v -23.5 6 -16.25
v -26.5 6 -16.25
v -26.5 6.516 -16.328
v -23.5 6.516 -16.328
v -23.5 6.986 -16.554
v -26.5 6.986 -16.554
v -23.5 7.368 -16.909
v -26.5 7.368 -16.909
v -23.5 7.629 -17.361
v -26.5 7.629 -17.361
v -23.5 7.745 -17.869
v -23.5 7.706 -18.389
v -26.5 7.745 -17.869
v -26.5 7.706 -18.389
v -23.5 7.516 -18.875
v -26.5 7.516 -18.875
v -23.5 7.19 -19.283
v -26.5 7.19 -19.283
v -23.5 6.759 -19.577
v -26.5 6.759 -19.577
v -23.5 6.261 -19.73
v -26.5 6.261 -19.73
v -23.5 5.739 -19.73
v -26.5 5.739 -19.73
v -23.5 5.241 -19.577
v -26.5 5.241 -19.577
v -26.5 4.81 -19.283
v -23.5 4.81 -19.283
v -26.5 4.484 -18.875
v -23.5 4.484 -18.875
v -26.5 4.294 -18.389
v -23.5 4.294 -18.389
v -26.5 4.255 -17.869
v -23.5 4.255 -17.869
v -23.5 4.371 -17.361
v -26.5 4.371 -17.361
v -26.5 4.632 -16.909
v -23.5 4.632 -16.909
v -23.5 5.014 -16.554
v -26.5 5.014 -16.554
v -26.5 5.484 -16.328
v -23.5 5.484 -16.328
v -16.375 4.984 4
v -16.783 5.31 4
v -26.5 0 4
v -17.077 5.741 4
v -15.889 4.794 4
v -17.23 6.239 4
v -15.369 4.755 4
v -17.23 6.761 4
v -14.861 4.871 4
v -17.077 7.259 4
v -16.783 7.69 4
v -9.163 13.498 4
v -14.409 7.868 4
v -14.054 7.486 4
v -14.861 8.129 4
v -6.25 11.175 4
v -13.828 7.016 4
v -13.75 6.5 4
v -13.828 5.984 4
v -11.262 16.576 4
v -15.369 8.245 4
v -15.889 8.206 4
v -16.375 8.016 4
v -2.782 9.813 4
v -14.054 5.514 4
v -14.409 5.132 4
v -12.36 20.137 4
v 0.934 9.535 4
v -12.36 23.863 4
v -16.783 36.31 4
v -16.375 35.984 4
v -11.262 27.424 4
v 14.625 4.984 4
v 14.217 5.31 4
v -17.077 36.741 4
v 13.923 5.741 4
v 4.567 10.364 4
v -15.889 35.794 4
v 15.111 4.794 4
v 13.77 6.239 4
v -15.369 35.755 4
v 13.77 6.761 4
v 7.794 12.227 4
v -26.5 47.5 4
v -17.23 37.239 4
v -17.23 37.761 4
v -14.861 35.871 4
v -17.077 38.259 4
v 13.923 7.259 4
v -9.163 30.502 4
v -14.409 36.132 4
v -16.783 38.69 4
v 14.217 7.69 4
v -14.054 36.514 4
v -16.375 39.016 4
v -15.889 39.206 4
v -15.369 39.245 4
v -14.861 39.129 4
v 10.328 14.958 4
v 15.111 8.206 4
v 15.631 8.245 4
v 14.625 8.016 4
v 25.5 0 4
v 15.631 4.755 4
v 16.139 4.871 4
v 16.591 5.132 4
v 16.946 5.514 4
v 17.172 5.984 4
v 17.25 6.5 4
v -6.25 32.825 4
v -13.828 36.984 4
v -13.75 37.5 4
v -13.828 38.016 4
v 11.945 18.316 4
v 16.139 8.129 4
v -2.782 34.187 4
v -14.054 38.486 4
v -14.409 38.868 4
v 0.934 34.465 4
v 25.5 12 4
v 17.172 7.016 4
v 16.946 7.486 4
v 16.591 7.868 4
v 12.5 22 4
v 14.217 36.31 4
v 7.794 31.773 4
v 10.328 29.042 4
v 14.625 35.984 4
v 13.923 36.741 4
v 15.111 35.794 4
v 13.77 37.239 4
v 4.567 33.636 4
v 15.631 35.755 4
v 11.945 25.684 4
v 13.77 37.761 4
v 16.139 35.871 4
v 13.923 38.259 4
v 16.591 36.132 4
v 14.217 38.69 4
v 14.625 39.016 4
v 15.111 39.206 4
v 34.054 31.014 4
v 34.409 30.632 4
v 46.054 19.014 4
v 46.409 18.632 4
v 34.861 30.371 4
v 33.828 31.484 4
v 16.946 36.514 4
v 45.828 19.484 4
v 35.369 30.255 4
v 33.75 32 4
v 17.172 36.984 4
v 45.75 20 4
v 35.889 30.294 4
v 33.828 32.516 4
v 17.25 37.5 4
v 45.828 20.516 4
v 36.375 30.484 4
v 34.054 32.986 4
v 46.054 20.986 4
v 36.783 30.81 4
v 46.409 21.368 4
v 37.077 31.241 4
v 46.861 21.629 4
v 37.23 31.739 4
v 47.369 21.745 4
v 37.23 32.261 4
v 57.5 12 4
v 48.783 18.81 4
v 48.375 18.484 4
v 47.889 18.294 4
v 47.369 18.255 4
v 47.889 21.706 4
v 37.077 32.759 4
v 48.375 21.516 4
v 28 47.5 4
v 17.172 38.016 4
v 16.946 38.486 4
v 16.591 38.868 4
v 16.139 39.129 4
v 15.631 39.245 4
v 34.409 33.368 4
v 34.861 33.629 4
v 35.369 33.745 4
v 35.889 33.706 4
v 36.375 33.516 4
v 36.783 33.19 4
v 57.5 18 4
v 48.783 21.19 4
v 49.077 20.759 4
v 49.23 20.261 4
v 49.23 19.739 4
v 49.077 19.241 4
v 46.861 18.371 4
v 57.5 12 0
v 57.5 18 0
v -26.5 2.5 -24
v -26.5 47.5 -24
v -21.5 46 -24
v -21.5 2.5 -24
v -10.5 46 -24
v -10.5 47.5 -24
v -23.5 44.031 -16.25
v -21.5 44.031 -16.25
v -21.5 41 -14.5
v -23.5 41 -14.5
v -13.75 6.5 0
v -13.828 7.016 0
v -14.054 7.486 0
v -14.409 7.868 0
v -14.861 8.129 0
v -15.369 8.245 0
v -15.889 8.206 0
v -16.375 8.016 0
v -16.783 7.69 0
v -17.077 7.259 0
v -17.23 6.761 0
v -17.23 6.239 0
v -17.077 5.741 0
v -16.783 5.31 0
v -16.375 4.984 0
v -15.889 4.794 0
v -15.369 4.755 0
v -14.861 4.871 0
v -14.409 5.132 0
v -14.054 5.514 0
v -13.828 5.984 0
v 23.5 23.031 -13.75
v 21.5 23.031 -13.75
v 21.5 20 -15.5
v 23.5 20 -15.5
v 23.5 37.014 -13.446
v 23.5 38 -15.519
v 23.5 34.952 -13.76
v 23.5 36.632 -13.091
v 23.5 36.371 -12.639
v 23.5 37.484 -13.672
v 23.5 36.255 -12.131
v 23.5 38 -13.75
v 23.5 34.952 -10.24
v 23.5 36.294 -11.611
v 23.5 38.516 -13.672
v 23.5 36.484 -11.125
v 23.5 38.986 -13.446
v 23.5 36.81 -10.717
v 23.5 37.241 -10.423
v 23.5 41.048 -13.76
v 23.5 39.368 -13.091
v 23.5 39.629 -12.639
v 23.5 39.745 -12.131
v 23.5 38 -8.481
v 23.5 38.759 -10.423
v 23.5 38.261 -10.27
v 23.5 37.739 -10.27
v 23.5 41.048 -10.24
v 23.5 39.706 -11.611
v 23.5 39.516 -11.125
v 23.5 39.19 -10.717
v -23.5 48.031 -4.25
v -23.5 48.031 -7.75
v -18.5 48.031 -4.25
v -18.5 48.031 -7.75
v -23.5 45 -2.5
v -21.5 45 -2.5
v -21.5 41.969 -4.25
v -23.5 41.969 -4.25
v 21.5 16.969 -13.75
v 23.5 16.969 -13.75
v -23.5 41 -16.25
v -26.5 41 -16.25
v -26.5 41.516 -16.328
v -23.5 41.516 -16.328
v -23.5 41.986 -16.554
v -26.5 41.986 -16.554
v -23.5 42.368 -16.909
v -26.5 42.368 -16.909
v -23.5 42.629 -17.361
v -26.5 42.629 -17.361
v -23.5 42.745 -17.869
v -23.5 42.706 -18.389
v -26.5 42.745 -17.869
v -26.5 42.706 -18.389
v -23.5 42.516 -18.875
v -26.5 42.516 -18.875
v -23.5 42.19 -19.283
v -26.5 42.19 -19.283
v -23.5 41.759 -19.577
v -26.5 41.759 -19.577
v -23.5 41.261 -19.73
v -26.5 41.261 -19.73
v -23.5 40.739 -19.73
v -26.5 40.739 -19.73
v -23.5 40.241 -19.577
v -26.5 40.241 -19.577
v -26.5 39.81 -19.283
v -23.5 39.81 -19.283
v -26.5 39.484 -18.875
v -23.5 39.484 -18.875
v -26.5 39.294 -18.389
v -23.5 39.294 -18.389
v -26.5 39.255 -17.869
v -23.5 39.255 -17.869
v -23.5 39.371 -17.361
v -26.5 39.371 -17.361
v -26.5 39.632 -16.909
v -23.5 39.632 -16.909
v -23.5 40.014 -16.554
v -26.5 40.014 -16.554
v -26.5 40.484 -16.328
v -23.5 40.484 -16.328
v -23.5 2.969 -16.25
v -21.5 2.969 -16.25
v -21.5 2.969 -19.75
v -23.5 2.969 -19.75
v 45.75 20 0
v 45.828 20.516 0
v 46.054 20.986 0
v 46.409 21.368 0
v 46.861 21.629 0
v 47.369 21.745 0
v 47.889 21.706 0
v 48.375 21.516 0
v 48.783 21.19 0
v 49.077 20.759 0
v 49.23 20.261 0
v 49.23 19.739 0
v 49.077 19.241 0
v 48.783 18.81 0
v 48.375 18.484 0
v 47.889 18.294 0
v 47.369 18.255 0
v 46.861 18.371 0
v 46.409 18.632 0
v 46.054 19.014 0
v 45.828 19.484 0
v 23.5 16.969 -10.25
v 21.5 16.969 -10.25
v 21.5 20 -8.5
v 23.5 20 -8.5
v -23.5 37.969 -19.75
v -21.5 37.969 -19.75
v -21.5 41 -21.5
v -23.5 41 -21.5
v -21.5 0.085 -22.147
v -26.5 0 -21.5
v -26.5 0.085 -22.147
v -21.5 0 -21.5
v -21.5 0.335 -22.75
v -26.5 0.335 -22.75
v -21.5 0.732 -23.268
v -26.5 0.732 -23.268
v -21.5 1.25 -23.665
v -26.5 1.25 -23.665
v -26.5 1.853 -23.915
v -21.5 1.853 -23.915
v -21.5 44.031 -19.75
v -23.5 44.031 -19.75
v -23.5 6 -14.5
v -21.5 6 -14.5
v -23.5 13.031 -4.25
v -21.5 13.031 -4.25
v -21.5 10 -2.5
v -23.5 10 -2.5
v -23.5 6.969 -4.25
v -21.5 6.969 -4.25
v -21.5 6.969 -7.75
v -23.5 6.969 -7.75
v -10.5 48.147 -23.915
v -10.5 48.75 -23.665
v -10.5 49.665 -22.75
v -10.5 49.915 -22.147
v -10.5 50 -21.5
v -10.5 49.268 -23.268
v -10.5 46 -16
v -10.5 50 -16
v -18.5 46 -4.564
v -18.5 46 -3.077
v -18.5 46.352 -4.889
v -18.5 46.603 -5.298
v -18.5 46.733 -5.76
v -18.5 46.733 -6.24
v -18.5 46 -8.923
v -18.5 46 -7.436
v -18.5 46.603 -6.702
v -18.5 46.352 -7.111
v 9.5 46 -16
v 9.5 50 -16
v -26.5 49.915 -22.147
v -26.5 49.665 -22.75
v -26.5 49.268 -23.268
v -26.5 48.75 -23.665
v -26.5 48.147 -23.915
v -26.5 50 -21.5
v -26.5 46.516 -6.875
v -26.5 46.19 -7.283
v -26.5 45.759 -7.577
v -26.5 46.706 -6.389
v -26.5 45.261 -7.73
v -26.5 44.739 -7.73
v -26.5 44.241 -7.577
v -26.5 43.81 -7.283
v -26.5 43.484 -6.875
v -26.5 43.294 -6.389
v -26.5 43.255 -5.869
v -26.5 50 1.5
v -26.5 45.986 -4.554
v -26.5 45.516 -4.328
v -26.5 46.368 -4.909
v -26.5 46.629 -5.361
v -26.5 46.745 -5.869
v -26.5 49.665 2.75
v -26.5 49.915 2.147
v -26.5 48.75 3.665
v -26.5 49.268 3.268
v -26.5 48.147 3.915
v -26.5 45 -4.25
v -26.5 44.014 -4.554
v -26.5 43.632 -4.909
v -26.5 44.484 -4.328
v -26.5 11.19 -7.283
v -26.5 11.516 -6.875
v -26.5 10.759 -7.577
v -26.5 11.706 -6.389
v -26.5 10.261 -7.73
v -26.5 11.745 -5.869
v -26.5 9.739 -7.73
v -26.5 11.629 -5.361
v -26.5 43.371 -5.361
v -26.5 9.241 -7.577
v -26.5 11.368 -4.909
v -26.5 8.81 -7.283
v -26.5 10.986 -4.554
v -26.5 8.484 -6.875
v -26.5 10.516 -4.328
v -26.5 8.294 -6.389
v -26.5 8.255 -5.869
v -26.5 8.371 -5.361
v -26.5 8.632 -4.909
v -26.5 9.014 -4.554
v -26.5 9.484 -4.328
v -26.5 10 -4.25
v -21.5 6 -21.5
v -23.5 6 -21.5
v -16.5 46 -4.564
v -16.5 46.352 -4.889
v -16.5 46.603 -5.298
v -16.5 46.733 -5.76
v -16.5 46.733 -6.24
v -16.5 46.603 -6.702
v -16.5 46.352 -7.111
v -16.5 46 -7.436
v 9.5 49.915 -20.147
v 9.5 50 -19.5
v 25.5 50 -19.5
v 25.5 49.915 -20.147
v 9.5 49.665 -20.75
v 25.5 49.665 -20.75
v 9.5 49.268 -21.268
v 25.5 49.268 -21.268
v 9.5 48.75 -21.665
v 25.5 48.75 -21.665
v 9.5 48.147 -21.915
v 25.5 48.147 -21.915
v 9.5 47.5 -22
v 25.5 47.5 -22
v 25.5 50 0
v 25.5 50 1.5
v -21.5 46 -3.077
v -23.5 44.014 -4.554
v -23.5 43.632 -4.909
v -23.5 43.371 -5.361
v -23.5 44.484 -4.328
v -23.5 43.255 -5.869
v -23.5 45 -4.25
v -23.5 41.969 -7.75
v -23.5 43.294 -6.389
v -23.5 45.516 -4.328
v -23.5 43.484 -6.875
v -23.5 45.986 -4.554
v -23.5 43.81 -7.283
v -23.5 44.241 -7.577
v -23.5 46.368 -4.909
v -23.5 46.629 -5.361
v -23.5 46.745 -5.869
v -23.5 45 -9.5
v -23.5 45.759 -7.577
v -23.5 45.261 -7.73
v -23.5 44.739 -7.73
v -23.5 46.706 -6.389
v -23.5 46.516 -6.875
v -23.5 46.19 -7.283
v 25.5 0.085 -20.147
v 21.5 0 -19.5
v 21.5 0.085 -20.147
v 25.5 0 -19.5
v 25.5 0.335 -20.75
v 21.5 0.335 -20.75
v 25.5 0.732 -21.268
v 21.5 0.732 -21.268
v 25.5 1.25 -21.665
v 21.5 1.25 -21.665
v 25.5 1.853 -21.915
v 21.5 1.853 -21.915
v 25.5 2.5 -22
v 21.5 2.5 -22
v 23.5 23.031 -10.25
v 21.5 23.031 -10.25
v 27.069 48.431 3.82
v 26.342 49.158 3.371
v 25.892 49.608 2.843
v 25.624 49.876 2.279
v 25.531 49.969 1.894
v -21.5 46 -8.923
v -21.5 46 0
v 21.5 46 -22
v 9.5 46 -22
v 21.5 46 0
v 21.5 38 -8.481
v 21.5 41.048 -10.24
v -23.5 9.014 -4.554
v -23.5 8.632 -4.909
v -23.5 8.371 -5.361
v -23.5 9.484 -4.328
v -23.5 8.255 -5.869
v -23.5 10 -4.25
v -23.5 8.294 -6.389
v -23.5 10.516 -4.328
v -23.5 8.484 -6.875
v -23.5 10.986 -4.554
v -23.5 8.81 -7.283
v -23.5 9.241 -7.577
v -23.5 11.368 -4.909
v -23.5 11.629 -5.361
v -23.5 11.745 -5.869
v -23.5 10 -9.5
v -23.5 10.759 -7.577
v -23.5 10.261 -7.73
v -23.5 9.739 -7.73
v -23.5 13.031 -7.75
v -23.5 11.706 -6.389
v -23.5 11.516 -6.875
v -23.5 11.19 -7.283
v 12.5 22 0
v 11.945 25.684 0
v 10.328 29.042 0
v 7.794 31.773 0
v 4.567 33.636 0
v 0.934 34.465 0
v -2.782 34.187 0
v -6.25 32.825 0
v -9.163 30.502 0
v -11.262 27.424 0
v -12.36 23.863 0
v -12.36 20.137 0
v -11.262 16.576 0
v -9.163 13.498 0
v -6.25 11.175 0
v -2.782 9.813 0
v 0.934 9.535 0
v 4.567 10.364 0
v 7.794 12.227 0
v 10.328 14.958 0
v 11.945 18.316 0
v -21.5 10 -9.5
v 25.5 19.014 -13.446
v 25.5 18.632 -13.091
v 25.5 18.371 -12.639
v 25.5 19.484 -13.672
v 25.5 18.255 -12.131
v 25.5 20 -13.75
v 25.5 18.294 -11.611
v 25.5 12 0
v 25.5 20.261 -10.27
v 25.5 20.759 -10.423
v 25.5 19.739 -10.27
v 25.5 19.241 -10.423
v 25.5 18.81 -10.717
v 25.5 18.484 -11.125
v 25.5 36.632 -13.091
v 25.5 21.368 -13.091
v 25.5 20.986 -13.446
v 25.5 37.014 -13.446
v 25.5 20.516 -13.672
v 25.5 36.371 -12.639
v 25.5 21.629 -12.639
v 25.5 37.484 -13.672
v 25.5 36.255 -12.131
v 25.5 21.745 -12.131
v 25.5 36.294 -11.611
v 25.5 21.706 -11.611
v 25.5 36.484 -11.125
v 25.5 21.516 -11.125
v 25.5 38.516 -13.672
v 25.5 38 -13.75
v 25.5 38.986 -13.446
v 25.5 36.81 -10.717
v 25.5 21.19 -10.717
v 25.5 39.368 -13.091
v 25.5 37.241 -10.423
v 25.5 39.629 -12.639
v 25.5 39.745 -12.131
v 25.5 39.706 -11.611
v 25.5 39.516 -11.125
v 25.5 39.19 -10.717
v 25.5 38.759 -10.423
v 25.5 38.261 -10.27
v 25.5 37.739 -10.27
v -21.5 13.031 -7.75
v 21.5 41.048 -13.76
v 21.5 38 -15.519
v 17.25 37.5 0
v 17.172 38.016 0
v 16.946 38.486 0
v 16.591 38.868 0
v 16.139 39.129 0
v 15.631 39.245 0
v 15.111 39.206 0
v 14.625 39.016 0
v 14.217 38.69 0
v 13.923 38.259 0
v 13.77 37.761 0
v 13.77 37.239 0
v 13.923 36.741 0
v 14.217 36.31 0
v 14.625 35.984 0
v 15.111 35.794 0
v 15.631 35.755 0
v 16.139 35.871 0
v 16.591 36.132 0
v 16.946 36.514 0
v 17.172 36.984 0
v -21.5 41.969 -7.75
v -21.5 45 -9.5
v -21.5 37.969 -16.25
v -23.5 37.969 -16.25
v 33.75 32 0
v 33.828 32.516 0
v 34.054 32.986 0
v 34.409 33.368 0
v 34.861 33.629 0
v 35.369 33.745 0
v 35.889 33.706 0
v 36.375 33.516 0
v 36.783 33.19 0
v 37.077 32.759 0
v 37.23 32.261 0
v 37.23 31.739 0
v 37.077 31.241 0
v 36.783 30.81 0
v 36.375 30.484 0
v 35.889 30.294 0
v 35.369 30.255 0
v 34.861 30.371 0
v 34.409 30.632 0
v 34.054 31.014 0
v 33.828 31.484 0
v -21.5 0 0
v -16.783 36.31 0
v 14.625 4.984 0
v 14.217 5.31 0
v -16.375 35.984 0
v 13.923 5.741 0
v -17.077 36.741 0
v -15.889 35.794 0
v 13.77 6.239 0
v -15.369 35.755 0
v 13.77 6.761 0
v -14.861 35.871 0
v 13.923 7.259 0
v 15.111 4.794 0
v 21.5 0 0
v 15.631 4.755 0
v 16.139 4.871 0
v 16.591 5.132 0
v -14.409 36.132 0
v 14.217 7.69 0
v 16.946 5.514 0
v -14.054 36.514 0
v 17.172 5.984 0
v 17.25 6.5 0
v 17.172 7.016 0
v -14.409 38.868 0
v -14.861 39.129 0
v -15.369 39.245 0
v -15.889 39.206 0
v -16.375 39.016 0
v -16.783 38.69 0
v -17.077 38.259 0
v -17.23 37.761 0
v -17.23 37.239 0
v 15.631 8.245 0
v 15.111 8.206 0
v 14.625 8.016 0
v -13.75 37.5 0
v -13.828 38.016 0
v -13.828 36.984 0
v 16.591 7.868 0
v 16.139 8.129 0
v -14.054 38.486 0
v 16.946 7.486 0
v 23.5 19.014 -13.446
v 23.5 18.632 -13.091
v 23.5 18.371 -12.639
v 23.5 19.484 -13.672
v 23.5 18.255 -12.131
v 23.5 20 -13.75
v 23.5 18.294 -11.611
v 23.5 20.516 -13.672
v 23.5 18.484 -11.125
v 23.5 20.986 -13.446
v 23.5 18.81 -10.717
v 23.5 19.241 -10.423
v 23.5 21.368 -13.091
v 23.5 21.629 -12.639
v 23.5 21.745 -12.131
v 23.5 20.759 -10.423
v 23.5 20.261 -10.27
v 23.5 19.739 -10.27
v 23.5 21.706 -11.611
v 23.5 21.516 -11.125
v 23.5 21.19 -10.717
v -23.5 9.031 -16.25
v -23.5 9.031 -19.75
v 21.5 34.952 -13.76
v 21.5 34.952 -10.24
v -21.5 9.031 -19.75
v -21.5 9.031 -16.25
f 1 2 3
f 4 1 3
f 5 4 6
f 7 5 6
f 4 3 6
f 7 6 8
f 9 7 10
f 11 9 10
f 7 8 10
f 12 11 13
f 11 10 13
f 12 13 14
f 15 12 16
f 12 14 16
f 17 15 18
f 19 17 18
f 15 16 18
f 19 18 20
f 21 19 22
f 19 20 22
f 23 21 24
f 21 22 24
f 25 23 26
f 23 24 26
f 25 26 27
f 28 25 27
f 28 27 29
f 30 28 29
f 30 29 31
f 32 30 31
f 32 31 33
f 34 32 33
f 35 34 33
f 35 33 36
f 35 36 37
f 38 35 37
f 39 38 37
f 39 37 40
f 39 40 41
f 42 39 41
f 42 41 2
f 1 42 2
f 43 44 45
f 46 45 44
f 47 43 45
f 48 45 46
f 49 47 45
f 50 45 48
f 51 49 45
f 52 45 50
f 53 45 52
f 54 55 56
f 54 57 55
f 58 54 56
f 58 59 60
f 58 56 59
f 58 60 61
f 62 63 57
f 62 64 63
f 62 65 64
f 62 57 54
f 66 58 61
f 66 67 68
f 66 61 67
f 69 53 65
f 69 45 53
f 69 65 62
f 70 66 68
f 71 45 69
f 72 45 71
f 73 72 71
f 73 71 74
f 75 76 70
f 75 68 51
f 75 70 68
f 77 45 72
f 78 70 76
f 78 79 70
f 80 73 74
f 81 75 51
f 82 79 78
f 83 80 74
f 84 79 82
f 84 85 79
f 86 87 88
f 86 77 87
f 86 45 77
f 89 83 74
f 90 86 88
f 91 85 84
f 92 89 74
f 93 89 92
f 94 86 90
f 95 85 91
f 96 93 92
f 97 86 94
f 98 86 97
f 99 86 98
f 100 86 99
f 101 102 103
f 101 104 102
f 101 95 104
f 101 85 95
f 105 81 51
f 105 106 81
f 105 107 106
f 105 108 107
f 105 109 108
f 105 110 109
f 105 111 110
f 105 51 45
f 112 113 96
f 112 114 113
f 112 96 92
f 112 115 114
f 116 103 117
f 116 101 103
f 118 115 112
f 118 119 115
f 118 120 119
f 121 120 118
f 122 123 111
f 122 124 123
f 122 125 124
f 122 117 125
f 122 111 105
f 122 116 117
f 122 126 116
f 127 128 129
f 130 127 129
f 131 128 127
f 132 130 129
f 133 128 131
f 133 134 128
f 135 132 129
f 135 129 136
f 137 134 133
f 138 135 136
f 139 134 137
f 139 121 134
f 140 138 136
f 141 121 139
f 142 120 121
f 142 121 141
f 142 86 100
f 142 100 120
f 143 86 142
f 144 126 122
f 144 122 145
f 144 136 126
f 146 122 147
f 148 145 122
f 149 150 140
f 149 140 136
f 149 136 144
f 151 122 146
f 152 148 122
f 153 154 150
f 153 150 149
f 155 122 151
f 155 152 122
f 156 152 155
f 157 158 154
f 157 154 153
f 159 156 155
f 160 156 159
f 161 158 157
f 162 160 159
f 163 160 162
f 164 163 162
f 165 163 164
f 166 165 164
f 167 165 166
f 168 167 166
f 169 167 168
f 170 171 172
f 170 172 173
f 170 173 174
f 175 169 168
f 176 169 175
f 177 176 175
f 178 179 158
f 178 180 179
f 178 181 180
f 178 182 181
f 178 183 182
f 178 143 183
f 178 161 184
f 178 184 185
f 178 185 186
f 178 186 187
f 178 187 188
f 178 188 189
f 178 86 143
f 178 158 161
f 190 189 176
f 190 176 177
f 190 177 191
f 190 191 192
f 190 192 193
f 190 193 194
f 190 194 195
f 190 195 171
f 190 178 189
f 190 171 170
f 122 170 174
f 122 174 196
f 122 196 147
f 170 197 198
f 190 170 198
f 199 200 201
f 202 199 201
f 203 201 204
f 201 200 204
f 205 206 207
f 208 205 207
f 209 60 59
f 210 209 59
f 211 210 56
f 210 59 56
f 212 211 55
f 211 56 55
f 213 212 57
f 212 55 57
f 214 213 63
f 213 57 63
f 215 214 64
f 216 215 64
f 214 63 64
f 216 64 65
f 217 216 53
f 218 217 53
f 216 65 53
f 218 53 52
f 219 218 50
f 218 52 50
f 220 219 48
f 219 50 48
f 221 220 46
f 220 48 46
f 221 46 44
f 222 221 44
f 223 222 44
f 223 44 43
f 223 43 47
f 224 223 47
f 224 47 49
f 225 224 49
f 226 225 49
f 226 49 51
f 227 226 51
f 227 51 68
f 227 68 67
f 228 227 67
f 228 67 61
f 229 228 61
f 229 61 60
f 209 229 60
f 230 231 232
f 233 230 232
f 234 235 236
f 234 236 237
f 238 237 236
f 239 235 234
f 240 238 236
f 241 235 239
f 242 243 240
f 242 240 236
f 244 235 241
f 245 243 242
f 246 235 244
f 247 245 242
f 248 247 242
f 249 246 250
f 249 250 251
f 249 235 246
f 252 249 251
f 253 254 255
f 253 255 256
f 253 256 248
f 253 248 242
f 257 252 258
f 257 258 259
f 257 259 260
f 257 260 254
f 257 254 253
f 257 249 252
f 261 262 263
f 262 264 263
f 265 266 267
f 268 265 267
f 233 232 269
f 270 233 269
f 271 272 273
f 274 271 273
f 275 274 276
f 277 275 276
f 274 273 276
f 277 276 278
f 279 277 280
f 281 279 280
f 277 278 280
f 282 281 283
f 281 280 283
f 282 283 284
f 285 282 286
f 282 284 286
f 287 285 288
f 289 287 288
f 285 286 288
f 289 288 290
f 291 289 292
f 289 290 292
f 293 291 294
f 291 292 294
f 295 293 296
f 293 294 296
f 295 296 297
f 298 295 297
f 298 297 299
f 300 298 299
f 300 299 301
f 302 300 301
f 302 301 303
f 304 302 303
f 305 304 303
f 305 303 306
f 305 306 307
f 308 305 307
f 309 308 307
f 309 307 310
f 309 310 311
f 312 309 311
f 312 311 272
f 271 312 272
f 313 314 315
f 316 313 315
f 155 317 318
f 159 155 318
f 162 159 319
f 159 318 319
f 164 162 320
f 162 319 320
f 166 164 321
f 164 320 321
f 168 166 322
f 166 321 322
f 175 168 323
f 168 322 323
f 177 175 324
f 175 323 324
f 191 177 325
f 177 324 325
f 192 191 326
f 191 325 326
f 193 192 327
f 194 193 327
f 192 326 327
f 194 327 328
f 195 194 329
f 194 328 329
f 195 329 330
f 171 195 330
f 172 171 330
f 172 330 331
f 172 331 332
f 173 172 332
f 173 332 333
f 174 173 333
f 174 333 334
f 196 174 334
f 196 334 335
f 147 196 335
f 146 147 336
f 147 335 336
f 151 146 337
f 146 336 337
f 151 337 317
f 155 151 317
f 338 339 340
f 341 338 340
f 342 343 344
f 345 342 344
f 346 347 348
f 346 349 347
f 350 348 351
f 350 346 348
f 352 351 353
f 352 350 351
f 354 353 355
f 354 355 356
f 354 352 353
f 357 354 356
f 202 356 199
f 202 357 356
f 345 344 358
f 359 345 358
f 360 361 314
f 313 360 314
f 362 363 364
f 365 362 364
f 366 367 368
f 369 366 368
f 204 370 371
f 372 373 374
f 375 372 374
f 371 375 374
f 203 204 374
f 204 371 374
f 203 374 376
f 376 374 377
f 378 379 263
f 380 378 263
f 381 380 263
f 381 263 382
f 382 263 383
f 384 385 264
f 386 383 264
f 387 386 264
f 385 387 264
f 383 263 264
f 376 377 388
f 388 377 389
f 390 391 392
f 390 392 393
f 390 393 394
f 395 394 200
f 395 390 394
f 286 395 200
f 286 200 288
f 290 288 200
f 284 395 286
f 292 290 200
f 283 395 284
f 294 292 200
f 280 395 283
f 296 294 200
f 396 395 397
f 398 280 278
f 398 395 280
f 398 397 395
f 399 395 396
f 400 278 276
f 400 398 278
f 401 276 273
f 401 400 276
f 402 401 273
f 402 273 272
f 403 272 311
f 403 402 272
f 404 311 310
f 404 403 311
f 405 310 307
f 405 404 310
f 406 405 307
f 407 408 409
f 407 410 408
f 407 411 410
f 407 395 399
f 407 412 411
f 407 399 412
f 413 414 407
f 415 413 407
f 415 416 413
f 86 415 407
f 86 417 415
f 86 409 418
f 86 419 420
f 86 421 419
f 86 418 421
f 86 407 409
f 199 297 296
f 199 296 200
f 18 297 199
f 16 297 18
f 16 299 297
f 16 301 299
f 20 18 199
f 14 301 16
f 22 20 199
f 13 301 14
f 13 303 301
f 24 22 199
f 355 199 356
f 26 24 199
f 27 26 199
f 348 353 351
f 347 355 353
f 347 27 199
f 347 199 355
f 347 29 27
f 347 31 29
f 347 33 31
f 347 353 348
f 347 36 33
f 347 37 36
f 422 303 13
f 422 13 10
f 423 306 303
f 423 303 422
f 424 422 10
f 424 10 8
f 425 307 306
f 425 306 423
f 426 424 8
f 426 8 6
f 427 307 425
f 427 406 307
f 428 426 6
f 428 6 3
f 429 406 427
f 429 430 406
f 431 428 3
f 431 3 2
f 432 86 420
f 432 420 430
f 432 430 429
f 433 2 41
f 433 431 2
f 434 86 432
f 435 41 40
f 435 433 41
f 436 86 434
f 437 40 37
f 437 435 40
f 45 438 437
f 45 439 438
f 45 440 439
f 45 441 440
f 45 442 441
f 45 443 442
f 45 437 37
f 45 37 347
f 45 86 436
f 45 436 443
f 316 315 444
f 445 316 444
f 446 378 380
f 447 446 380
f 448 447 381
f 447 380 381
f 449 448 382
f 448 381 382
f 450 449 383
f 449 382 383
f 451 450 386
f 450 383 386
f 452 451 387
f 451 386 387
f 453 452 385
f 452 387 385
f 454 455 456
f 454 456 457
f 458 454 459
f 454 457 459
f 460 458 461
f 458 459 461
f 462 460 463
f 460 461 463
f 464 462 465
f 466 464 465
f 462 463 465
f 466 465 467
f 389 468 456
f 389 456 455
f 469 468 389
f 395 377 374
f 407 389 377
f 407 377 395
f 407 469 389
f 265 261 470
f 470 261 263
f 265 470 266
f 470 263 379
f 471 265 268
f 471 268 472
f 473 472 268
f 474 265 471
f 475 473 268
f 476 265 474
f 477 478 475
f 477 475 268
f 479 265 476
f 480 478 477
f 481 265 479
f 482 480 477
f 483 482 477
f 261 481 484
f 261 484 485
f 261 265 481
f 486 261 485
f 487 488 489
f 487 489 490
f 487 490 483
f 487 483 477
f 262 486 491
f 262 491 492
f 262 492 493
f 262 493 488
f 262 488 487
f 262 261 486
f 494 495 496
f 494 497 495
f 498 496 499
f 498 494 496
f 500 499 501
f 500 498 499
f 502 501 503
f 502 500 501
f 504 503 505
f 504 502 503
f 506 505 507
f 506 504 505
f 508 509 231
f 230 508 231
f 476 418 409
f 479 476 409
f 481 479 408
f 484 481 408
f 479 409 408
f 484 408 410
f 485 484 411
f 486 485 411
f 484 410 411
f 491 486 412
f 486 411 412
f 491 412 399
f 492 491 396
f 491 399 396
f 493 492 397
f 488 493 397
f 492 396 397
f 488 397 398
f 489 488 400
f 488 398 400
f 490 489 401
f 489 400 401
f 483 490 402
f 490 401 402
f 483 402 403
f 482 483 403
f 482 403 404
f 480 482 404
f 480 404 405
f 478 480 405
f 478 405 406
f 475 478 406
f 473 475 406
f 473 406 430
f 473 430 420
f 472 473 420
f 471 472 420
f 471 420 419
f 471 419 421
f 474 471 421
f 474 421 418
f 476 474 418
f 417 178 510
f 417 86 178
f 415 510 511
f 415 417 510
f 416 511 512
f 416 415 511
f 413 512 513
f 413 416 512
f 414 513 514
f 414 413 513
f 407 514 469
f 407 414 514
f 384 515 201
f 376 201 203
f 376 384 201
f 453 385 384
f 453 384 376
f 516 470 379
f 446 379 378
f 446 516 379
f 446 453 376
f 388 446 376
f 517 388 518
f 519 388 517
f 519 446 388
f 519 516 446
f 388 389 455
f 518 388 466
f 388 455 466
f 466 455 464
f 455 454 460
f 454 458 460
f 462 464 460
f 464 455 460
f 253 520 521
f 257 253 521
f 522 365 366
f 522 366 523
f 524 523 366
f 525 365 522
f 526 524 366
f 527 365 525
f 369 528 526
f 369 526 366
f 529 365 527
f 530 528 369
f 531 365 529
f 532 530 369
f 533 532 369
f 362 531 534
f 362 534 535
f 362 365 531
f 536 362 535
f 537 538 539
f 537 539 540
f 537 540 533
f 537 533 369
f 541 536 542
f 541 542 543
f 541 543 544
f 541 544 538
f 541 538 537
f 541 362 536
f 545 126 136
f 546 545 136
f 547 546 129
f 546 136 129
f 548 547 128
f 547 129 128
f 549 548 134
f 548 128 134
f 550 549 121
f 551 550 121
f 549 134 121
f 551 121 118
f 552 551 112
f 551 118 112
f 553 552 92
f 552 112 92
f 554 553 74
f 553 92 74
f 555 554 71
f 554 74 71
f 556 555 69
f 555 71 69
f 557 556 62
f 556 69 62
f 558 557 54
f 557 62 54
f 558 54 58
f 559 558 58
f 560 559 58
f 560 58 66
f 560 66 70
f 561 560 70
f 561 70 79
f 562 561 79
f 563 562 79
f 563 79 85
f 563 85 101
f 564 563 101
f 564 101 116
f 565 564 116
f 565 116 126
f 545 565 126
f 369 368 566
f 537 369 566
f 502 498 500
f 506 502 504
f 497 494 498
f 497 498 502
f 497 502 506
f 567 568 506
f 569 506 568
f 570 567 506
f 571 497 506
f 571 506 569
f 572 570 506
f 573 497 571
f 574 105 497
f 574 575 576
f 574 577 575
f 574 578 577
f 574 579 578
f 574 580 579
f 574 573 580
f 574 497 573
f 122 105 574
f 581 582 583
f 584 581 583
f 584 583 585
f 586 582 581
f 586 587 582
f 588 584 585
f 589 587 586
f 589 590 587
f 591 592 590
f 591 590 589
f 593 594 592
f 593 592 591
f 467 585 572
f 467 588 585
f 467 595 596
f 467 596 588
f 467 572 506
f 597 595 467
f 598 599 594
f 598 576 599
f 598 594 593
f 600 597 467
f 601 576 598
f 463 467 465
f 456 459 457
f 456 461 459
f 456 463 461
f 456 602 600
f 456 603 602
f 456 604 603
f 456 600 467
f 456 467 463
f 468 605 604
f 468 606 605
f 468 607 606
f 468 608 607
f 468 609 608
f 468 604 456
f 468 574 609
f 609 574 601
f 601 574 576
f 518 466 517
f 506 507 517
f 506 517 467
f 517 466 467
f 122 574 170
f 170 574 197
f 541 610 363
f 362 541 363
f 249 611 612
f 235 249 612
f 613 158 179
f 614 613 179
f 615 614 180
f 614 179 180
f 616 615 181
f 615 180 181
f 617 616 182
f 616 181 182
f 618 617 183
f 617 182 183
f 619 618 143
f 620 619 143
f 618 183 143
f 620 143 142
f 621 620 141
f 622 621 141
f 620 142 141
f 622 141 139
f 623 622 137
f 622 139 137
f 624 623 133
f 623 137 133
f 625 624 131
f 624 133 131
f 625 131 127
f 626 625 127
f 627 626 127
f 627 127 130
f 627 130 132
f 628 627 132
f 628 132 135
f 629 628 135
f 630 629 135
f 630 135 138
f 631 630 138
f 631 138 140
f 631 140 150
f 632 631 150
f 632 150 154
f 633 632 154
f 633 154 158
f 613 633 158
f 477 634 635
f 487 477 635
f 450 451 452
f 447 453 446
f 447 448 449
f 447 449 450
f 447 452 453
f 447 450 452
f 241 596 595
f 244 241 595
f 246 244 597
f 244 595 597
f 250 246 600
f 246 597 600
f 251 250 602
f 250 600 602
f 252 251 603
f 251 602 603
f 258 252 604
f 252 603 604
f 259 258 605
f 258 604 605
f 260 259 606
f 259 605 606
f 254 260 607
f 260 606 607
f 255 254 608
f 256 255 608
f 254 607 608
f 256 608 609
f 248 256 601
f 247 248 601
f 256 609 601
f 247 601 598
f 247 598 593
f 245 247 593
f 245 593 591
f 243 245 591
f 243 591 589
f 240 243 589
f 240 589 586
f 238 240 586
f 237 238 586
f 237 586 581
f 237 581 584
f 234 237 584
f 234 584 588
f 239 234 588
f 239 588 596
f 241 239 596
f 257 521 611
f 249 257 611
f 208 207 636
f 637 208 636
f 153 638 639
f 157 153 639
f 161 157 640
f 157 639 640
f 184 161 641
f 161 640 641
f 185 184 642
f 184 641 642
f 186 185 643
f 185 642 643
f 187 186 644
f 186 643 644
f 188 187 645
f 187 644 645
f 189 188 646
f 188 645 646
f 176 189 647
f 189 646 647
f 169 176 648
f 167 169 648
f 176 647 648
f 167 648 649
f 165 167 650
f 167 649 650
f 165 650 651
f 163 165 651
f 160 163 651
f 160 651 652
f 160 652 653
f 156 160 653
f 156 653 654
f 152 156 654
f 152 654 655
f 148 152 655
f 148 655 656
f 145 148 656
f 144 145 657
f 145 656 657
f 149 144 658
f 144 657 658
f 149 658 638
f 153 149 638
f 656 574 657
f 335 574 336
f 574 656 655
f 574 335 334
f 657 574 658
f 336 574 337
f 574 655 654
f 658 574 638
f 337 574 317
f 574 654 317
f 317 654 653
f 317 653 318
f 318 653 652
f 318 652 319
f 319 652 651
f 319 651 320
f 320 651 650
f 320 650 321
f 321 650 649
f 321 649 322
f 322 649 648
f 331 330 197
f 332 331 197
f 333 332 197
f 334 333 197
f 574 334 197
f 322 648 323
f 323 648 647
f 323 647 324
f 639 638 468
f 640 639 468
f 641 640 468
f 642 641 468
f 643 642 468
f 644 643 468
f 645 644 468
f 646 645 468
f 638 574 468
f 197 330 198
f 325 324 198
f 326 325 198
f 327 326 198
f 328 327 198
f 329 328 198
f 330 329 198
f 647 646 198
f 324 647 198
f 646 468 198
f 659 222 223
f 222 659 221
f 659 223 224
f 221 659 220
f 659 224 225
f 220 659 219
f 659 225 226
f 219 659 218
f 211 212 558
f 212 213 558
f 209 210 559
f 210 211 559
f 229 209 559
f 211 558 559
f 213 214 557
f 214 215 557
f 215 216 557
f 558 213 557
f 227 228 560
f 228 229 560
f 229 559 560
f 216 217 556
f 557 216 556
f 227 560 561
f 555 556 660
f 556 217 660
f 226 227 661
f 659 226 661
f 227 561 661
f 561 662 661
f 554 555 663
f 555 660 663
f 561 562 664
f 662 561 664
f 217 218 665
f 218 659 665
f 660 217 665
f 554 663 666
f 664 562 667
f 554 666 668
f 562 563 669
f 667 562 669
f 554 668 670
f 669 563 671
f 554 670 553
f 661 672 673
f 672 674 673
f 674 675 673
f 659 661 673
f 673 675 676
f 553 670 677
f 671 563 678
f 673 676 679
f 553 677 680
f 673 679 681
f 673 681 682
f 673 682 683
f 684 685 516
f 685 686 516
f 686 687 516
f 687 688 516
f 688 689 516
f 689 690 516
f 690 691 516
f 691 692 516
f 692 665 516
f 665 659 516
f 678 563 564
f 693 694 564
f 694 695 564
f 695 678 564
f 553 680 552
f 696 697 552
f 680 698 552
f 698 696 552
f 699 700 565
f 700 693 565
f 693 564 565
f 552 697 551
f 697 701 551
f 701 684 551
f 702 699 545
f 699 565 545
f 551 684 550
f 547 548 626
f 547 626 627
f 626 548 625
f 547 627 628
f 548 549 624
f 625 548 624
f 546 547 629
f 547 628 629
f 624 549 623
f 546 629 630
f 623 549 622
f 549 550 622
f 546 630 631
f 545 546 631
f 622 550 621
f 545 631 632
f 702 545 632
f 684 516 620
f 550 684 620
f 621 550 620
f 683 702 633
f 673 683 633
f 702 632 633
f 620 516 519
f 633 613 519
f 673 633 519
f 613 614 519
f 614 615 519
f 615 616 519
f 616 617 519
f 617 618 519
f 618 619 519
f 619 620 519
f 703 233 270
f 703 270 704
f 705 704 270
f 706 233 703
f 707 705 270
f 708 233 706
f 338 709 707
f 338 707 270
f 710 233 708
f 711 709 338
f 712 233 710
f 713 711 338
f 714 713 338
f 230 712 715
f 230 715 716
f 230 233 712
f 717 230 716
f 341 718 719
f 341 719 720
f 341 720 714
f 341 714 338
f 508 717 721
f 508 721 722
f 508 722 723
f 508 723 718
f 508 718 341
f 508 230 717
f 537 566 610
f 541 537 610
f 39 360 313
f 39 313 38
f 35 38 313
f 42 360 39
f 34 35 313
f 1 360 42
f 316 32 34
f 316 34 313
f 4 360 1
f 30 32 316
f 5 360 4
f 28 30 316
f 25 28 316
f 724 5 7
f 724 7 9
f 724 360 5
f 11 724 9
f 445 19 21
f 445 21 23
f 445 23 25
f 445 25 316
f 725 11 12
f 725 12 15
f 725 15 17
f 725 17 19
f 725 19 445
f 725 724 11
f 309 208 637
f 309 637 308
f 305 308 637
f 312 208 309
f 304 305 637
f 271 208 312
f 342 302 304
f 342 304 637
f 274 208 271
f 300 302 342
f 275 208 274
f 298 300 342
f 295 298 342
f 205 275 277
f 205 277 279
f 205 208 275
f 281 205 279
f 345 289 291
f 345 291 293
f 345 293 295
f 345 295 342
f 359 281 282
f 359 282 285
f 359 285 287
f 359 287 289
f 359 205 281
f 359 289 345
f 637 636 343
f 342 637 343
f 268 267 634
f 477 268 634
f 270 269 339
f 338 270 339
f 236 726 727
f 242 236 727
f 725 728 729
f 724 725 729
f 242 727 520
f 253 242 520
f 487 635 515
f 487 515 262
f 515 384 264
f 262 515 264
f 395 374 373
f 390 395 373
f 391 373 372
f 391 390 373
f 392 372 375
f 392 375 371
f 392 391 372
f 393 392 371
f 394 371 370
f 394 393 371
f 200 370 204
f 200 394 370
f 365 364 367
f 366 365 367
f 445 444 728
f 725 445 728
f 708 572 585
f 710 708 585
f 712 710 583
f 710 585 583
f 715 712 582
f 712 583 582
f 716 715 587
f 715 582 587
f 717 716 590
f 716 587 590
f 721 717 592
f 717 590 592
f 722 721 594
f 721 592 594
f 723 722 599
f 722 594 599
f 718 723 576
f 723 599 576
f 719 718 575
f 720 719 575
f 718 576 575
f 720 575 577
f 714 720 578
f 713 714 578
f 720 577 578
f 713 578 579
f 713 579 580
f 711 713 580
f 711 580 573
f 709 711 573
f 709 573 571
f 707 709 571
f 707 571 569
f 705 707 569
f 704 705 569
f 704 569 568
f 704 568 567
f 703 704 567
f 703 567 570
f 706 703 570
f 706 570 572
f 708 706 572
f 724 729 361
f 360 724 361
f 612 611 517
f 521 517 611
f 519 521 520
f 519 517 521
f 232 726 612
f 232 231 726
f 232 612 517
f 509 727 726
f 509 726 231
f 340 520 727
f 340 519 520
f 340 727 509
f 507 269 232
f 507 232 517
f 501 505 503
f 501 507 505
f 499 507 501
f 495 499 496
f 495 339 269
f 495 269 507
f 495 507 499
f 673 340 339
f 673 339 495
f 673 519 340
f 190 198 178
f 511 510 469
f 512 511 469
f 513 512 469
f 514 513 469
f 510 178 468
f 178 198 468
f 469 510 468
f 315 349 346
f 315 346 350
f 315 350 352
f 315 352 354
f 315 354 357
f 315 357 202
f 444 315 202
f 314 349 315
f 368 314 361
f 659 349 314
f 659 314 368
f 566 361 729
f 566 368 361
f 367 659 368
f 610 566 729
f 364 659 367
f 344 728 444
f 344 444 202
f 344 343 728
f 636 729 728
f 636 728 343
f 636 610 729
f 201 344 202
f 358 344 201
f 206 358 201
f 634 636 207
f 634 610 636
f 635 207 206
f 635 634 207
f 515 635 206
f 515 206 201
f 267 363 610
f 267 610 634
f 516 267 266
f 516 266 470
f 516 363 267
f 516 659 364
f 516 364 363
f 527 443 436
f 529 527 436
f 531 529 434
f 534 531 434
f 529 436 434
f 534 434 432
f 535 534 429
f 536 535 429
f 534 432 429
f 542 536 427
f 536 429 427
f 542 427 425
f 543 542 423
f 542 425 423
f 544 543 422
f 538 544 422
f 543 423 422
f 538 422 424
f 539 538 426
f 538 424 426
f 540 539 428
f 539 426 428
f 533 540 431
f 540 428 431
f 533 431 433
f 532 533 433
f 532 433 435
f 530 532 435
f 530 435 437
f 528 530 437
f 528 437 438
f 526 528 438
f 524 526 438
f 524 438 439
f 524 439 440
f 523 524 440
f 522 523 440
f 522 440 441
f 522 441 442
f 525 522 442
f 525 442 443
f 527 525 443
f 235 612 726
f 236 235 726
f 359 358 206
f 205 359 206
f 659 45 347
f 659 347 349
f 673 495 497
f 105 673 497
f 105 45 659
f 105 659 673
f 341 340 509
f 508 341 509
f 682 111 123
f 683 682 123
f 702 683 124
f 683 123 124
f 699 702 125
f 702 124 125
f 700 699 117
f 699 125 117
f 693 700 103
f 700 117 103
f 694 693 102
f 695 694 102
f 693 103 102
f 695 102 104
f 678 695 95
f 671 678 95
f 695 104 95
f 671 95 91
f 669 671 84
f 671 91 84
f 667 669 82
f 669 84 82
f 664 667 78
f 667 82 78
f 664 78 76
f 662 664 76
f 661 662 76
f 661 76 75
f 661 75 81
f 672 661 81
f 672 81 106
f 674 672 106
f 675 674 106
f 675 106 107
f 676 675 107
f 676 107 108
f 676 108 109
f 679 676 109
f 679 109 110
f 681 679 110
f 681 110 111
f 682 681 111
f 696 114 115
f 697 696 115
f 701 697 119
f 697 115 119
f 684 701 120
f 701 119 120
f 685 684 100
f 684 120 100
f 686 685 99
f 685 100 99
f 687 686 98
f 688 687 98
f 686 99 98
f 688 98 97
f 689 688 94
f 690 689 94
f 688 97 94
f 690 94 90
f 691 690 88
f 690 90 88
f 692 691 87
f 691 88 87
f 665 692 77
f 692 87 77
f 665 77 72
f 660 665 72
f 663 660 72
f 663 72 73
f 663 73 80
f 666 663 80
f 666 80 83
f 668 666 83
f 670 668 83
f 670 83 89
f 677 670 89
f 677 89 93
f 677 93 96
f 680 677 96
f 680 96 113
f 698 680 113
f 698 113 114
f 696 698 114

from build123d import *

# Parameters (mm, degrees)
BOSS_EXTRUDE1_DEPTH      = 4
SKETCH2_R                = 12.5
SKETCH2_R_2              = 1.75
CUT_EXTRUDE1_DEPTH       = 5
SKETCH9_R                = 1.75
CUT_EXTRUDE2_DEPTH       = 4
BOSS_EXTRUDE8_DEPTH      = 24
SKETCH18_R               = 1.75
CUT_EXTRUDE7_DEPTH       = 4
SKETCH19_R               = 1.75
CUT_EXTRUDE8_DEPTH       = 10
CUT_EXTRUDE9_DEPTH       = 50
FILLET1_R                = 2.5
CUT_EXTRUDE11_DEPTH      = 3
CUT_EXTRUDE11_DEPTH_BACK = 2
CUT_EXTRUDE12_DEPTH      = 2
CUT_EXTRUDE13_DEPTH      = 2
FILLET2_R                = 2.5


with BuildPart() as part:
    # Sketch1 → Boss-Extrude1 (new body)
    with BuildSketch(Plane.XY):
        Polygon((57.5, 18), (25.5, 50), (-26.5, 50), (-26.5, 0), (25.5, 0), (25.5, 12), (57.5, 12), align=None)
    extrude(amount=BOSS_EXTRUDE1_DEPTH)

    # Sketch2 → Cut-Extrude1 (cut, through all)
    with BuildSketch(Plane.XY.offset(4)):
        with Locations((0, 22)):
            Circle(SKETCH2_R)
        with Locations((15.5, 6.5)):
            Circle(SKETCH2_R_2)
        with Locations((15.5, 37.5)):
            Circle(SKETCH2_R_2)
        with Locations((-15.5, 37.5)):
            Circle(SKETCH2_R_2)
        with Locations((-15.5, 6.5)):
            Circle(SKETCH2_R_2)
    extrude(amount=-CUT_EXTRUDE1_DEPTH, mode=Mode.SUBTRACT)

    # Sketch9 → Cut-Extrude2 (cut)
    with BuildSketch(Plane(origin=(0, 0, 0), x_dir=(-1, 0, 0), z_dir=(0, 0, -1))):
        with Locations((-47.5, 20)):
            Circle(SKETCH9_R)
        with Locations((-35.5, 32)):
            Circle(SKETCH9_R)
    extrude(amount=-CUT_EXTRUDE2_DEPTH, mode=Mode.SUBTRACT)

    # Sketch17 → Boss-Extrude8 (add)
    with BuildSketch(Plane(origin=(0, 0, 0), x_dir=(-1, 0, 0), z_dir=(0, 0, -1))):
        Polygon((-25.5, 0), (-25.5, 50), (26.5, 50), (26.5, 0), (21.5, 0), (21.5, 46), (-21.5, 46), (-21.5, 0), align=None)
    extrude(amount=BOSS_EXTRUDE8_DEPTH)

    # Sketch18 → Cut-Extrude7 (cut)
    with BuildSketch(Plane(origin=(25.5, 0, 0), x_dir=(0, 0, -1), z_dir=(1, 0, 0))):
        with Locations((12, 38)):
            Circle(SKETCH18_R)
        with Locations((12, 20)):
            Circle(SKETCH18_R)
    extrude(amount=-CUT_EXTRUDE7_DEPTH, mode=Mode.SUBTRACT)

    # Sketch19 → Cut-Extrude8 (cut)
    with BuildSketch(Plane.ZY.offset(26.5)):
        with Locations((-18, 6)):
            Circle(SKETCH19_R)
        with Locations((-18, 41)):
            Circle(SKETCH19_R)
        with Locations((-6, 10)):
            Circle(SKETCH19_R)
        with Locations((-6, 45)):
            Circle(SKETCH19_R)
    extrude(amount=-CUT_EXTRUDE8_DEPTH, mode=Mode.SUBTRACT)

    # Sketch20 → Cut-Extrude9 (cut)
    with BuildSketch(Plane(origin=(0, 50, 0), x_dir=(1, 0, 0), z_dir=(0, 1, 0))):
        Polygon((25.5, 24), (-10.5, 24), (-10.5, 16), (9.5, 16), (9.5, 22), (25.5, 22), align=None)
    extrude(amount=-CUT_EXTRUDE9_DEPTH, mode=Mode.SUBTRACT)

    # Fillet1
    fillet1_edges = [part.edges().sort_by_distance(p)[0] for p in [
        (23.5, 0, -22),
        (17.5, 50, -22),
        (-24, 0, -24),
        (-18.5, 50, -24),
    ]]
    fillet(fillet1_edges, radius=FILLET1_R)

    # Sketch22 → Cut-Extrude11 (cut, two sides)
    with BuildSketch(Plane(origin=(-21.5, 0, 0), x_dir=(0, 0, -1), z_dir=(1, 0, 0))) as cut_extrude11_sk:
        Polygon((7.75, 41.968911087), (9.5, 45), (7.75, 48.031088913), (4.25, 48.031088913), (2.5, 45), (4.25, 41.968911087), align=None)
    extrude(amount=CUT_EXTRUDE11_DEPTH, mode=Mode.SUBTRACT)
    extrude(cut_extrude11_sk.sketch, amount=-CUT_EXTRUDE11_DEPTH_BACK, mode=Mode.SUBTRACT)

    # Sketch23 → Cut-Extrude12 (cut)
    with BuildSketch(Plane(origin=(-21.5, 0, 0), x_dir=(0, 0, -1), z_dir=(1, 0, 0))):
        Polygon((19.75, 37.968911087), (21.5, 41), (19.75, 44.031088913), (16.25, 44.031088913), (14.5, 41), (16.25, 37.968911087), align=None)
        Polygon((7.75, 6.968911087), (9.5, 10), (7.75, 13.031088913), (4.25, 13.031088913), (2.5, 10), (4.25, 6.968911087), align=None)
        Polygon((16.25, 2.968911087), (19.75, 2.968911087), (21.5, 6), (19.75, 9.031088913), (16.25, 9.031088913), (14.5, 6), align=None)
    extrude(amount=-CUT_EXTRUDE12_DEPTH, mode=Mode.SUBTRACT)

    # Sketch24 → Cut-Extrude13 (cut)
    with BuildSketch(Plane.ZY.offset(-21.5)):
        Polygon((-10.240287428, 41.047911581), (-13.759712572, 41.047911581), (-15.519425144, 38), (-13.759712572, 34.952088419), (-10.240287428, 34.952088419), (-8.480574856, 38), align=None)
        Polygon((-10.25, 23.031088913), (-13.75, 23.031088913), (-15.5, 20), (-13.75, 16.968911087), (-10.25, 16.968911087), (-8.5, 20), align=None)
    extrude(amount=-CUT_EXTRUDE13_DEPTH, mode=Mode.SUBTRACT)

    # Fillet2
    fillet2_edges = [part.edges().sort_by_distance(p)[0] for p in [
        (-0.5, 50, 4),
    ]]
    fillet(fillet2_edges, radius=FILLET2_R)


solid = part.part
